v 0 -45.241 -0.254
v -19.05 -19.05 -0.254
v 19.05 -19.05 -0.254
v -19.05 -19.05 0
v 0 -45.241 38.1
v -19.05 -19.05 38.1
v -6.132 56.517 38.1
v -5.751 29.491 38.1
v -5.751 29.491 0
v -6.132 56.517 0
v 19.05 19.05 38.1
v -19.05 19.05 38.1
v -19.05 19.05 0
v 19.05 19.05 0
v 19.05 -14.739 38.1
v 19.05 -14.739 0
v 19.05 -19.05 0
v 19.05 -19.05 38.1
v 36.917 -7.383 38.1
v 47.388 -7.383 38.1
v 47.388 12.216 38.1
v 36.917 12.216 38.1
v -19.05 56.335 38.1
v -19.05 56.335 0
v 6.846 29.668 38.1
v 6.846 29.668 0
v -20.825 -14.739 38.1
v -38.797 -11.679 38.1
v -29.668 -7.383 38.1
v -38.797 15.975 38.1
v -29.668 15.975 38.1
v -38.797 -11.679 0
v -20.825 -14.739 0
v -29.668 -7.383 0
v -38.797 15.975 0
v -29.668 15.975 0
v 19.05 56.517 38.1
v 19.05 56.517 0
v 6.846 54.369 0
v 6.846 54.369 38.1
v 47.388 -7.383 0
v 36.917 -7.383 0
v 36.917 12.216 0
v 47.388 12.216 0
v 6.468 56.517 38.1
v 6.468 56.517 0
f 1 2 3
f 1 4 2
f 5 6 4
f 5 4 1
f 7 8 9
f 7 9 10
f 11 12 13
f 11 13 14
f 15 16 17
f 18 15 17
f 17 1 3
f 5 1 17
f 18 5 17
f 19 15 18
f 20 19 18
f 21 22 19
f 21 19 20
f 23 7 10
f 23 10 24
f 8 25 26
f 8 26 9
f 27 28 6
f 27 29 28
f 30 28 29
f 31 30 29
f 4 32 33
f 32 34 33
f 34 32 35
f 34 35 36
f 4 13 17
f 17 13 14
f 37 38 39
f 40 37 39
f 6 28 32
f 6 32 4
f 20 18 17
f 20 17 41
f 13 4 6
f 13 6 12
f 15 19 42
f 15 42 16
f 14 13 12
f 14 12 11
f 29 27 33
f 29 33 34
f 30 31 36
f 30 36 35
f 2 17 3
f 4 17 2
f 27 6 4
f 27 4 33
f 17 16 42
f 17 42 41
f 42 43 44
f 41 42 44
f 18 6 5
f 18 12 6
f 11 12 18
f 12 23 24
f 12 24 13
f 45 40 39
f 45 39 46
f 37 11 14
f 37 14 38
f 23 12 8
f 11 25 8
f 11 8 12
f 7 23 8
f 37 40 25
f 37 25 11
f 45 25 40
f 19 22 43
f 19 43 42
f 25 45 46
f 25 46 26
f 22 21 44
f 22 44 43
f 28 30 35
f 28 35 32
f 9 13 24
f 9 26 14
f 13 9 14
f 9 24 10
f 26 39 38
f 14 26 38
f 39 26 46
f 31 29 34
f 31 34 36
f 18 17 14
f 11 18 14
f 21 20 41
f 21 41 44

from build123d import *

# Parameters (mm, degrees)
F0_W     = 38.1
F0_H     = 38.1
F2_DEPTH = 38.1
F4_DEPTH = 38.354
F6_DEPTH = 38.1


with BuildPart() as f2:
    # F0 (on Top) → F2 (new body)
    with BuildSketch(Plane.XY):
        Rectangle(F0_W, F0_H)
    extrude(amount=F2_DEPTH)

    # F3 (on face) → F4 (join)
    with BuildSketch(Plane.XY.offset(38.1)):
        Polygon((19.05, -19.05), (-19.05, -19.05), (0, -45.240555), align=None)
    extrude(amount=-F4_DEPTH)


with BuildPart() as f6:
    # F5 (on face) → F6 (new body)
    with BuildSketch(Plane.XY.offset(38.1)):
        Polygon((-19.05, 19.05), (19.05, 19.05), (19.05, 56.517132), (6.846494, 54.369211), (6.468442, 56.517132), (6.846494, 29.668139), (-5.751134, 29.490756), (-6.131683, 56.517132), (-19.05, 56.335233), align=None)
        Polygon((19.05, -14.739201), (19.05, -19.05), (47.388475, -7.383473), (47.388475, 12.216292), (36.917366, 12.216292), (36.917366, -7.383473), align=None)
        Polygon((-38.796797, -11.679313), (-19.05, -19.05), (-20.824692, -14.739201), (-29.668136, -7.383473), (-29.668136, 15.975151), (-38.796797, 15.975151), align=None)
    extrude(amount=-F6_DEPTH)


solid = Compound([f2.part, f6.part])
